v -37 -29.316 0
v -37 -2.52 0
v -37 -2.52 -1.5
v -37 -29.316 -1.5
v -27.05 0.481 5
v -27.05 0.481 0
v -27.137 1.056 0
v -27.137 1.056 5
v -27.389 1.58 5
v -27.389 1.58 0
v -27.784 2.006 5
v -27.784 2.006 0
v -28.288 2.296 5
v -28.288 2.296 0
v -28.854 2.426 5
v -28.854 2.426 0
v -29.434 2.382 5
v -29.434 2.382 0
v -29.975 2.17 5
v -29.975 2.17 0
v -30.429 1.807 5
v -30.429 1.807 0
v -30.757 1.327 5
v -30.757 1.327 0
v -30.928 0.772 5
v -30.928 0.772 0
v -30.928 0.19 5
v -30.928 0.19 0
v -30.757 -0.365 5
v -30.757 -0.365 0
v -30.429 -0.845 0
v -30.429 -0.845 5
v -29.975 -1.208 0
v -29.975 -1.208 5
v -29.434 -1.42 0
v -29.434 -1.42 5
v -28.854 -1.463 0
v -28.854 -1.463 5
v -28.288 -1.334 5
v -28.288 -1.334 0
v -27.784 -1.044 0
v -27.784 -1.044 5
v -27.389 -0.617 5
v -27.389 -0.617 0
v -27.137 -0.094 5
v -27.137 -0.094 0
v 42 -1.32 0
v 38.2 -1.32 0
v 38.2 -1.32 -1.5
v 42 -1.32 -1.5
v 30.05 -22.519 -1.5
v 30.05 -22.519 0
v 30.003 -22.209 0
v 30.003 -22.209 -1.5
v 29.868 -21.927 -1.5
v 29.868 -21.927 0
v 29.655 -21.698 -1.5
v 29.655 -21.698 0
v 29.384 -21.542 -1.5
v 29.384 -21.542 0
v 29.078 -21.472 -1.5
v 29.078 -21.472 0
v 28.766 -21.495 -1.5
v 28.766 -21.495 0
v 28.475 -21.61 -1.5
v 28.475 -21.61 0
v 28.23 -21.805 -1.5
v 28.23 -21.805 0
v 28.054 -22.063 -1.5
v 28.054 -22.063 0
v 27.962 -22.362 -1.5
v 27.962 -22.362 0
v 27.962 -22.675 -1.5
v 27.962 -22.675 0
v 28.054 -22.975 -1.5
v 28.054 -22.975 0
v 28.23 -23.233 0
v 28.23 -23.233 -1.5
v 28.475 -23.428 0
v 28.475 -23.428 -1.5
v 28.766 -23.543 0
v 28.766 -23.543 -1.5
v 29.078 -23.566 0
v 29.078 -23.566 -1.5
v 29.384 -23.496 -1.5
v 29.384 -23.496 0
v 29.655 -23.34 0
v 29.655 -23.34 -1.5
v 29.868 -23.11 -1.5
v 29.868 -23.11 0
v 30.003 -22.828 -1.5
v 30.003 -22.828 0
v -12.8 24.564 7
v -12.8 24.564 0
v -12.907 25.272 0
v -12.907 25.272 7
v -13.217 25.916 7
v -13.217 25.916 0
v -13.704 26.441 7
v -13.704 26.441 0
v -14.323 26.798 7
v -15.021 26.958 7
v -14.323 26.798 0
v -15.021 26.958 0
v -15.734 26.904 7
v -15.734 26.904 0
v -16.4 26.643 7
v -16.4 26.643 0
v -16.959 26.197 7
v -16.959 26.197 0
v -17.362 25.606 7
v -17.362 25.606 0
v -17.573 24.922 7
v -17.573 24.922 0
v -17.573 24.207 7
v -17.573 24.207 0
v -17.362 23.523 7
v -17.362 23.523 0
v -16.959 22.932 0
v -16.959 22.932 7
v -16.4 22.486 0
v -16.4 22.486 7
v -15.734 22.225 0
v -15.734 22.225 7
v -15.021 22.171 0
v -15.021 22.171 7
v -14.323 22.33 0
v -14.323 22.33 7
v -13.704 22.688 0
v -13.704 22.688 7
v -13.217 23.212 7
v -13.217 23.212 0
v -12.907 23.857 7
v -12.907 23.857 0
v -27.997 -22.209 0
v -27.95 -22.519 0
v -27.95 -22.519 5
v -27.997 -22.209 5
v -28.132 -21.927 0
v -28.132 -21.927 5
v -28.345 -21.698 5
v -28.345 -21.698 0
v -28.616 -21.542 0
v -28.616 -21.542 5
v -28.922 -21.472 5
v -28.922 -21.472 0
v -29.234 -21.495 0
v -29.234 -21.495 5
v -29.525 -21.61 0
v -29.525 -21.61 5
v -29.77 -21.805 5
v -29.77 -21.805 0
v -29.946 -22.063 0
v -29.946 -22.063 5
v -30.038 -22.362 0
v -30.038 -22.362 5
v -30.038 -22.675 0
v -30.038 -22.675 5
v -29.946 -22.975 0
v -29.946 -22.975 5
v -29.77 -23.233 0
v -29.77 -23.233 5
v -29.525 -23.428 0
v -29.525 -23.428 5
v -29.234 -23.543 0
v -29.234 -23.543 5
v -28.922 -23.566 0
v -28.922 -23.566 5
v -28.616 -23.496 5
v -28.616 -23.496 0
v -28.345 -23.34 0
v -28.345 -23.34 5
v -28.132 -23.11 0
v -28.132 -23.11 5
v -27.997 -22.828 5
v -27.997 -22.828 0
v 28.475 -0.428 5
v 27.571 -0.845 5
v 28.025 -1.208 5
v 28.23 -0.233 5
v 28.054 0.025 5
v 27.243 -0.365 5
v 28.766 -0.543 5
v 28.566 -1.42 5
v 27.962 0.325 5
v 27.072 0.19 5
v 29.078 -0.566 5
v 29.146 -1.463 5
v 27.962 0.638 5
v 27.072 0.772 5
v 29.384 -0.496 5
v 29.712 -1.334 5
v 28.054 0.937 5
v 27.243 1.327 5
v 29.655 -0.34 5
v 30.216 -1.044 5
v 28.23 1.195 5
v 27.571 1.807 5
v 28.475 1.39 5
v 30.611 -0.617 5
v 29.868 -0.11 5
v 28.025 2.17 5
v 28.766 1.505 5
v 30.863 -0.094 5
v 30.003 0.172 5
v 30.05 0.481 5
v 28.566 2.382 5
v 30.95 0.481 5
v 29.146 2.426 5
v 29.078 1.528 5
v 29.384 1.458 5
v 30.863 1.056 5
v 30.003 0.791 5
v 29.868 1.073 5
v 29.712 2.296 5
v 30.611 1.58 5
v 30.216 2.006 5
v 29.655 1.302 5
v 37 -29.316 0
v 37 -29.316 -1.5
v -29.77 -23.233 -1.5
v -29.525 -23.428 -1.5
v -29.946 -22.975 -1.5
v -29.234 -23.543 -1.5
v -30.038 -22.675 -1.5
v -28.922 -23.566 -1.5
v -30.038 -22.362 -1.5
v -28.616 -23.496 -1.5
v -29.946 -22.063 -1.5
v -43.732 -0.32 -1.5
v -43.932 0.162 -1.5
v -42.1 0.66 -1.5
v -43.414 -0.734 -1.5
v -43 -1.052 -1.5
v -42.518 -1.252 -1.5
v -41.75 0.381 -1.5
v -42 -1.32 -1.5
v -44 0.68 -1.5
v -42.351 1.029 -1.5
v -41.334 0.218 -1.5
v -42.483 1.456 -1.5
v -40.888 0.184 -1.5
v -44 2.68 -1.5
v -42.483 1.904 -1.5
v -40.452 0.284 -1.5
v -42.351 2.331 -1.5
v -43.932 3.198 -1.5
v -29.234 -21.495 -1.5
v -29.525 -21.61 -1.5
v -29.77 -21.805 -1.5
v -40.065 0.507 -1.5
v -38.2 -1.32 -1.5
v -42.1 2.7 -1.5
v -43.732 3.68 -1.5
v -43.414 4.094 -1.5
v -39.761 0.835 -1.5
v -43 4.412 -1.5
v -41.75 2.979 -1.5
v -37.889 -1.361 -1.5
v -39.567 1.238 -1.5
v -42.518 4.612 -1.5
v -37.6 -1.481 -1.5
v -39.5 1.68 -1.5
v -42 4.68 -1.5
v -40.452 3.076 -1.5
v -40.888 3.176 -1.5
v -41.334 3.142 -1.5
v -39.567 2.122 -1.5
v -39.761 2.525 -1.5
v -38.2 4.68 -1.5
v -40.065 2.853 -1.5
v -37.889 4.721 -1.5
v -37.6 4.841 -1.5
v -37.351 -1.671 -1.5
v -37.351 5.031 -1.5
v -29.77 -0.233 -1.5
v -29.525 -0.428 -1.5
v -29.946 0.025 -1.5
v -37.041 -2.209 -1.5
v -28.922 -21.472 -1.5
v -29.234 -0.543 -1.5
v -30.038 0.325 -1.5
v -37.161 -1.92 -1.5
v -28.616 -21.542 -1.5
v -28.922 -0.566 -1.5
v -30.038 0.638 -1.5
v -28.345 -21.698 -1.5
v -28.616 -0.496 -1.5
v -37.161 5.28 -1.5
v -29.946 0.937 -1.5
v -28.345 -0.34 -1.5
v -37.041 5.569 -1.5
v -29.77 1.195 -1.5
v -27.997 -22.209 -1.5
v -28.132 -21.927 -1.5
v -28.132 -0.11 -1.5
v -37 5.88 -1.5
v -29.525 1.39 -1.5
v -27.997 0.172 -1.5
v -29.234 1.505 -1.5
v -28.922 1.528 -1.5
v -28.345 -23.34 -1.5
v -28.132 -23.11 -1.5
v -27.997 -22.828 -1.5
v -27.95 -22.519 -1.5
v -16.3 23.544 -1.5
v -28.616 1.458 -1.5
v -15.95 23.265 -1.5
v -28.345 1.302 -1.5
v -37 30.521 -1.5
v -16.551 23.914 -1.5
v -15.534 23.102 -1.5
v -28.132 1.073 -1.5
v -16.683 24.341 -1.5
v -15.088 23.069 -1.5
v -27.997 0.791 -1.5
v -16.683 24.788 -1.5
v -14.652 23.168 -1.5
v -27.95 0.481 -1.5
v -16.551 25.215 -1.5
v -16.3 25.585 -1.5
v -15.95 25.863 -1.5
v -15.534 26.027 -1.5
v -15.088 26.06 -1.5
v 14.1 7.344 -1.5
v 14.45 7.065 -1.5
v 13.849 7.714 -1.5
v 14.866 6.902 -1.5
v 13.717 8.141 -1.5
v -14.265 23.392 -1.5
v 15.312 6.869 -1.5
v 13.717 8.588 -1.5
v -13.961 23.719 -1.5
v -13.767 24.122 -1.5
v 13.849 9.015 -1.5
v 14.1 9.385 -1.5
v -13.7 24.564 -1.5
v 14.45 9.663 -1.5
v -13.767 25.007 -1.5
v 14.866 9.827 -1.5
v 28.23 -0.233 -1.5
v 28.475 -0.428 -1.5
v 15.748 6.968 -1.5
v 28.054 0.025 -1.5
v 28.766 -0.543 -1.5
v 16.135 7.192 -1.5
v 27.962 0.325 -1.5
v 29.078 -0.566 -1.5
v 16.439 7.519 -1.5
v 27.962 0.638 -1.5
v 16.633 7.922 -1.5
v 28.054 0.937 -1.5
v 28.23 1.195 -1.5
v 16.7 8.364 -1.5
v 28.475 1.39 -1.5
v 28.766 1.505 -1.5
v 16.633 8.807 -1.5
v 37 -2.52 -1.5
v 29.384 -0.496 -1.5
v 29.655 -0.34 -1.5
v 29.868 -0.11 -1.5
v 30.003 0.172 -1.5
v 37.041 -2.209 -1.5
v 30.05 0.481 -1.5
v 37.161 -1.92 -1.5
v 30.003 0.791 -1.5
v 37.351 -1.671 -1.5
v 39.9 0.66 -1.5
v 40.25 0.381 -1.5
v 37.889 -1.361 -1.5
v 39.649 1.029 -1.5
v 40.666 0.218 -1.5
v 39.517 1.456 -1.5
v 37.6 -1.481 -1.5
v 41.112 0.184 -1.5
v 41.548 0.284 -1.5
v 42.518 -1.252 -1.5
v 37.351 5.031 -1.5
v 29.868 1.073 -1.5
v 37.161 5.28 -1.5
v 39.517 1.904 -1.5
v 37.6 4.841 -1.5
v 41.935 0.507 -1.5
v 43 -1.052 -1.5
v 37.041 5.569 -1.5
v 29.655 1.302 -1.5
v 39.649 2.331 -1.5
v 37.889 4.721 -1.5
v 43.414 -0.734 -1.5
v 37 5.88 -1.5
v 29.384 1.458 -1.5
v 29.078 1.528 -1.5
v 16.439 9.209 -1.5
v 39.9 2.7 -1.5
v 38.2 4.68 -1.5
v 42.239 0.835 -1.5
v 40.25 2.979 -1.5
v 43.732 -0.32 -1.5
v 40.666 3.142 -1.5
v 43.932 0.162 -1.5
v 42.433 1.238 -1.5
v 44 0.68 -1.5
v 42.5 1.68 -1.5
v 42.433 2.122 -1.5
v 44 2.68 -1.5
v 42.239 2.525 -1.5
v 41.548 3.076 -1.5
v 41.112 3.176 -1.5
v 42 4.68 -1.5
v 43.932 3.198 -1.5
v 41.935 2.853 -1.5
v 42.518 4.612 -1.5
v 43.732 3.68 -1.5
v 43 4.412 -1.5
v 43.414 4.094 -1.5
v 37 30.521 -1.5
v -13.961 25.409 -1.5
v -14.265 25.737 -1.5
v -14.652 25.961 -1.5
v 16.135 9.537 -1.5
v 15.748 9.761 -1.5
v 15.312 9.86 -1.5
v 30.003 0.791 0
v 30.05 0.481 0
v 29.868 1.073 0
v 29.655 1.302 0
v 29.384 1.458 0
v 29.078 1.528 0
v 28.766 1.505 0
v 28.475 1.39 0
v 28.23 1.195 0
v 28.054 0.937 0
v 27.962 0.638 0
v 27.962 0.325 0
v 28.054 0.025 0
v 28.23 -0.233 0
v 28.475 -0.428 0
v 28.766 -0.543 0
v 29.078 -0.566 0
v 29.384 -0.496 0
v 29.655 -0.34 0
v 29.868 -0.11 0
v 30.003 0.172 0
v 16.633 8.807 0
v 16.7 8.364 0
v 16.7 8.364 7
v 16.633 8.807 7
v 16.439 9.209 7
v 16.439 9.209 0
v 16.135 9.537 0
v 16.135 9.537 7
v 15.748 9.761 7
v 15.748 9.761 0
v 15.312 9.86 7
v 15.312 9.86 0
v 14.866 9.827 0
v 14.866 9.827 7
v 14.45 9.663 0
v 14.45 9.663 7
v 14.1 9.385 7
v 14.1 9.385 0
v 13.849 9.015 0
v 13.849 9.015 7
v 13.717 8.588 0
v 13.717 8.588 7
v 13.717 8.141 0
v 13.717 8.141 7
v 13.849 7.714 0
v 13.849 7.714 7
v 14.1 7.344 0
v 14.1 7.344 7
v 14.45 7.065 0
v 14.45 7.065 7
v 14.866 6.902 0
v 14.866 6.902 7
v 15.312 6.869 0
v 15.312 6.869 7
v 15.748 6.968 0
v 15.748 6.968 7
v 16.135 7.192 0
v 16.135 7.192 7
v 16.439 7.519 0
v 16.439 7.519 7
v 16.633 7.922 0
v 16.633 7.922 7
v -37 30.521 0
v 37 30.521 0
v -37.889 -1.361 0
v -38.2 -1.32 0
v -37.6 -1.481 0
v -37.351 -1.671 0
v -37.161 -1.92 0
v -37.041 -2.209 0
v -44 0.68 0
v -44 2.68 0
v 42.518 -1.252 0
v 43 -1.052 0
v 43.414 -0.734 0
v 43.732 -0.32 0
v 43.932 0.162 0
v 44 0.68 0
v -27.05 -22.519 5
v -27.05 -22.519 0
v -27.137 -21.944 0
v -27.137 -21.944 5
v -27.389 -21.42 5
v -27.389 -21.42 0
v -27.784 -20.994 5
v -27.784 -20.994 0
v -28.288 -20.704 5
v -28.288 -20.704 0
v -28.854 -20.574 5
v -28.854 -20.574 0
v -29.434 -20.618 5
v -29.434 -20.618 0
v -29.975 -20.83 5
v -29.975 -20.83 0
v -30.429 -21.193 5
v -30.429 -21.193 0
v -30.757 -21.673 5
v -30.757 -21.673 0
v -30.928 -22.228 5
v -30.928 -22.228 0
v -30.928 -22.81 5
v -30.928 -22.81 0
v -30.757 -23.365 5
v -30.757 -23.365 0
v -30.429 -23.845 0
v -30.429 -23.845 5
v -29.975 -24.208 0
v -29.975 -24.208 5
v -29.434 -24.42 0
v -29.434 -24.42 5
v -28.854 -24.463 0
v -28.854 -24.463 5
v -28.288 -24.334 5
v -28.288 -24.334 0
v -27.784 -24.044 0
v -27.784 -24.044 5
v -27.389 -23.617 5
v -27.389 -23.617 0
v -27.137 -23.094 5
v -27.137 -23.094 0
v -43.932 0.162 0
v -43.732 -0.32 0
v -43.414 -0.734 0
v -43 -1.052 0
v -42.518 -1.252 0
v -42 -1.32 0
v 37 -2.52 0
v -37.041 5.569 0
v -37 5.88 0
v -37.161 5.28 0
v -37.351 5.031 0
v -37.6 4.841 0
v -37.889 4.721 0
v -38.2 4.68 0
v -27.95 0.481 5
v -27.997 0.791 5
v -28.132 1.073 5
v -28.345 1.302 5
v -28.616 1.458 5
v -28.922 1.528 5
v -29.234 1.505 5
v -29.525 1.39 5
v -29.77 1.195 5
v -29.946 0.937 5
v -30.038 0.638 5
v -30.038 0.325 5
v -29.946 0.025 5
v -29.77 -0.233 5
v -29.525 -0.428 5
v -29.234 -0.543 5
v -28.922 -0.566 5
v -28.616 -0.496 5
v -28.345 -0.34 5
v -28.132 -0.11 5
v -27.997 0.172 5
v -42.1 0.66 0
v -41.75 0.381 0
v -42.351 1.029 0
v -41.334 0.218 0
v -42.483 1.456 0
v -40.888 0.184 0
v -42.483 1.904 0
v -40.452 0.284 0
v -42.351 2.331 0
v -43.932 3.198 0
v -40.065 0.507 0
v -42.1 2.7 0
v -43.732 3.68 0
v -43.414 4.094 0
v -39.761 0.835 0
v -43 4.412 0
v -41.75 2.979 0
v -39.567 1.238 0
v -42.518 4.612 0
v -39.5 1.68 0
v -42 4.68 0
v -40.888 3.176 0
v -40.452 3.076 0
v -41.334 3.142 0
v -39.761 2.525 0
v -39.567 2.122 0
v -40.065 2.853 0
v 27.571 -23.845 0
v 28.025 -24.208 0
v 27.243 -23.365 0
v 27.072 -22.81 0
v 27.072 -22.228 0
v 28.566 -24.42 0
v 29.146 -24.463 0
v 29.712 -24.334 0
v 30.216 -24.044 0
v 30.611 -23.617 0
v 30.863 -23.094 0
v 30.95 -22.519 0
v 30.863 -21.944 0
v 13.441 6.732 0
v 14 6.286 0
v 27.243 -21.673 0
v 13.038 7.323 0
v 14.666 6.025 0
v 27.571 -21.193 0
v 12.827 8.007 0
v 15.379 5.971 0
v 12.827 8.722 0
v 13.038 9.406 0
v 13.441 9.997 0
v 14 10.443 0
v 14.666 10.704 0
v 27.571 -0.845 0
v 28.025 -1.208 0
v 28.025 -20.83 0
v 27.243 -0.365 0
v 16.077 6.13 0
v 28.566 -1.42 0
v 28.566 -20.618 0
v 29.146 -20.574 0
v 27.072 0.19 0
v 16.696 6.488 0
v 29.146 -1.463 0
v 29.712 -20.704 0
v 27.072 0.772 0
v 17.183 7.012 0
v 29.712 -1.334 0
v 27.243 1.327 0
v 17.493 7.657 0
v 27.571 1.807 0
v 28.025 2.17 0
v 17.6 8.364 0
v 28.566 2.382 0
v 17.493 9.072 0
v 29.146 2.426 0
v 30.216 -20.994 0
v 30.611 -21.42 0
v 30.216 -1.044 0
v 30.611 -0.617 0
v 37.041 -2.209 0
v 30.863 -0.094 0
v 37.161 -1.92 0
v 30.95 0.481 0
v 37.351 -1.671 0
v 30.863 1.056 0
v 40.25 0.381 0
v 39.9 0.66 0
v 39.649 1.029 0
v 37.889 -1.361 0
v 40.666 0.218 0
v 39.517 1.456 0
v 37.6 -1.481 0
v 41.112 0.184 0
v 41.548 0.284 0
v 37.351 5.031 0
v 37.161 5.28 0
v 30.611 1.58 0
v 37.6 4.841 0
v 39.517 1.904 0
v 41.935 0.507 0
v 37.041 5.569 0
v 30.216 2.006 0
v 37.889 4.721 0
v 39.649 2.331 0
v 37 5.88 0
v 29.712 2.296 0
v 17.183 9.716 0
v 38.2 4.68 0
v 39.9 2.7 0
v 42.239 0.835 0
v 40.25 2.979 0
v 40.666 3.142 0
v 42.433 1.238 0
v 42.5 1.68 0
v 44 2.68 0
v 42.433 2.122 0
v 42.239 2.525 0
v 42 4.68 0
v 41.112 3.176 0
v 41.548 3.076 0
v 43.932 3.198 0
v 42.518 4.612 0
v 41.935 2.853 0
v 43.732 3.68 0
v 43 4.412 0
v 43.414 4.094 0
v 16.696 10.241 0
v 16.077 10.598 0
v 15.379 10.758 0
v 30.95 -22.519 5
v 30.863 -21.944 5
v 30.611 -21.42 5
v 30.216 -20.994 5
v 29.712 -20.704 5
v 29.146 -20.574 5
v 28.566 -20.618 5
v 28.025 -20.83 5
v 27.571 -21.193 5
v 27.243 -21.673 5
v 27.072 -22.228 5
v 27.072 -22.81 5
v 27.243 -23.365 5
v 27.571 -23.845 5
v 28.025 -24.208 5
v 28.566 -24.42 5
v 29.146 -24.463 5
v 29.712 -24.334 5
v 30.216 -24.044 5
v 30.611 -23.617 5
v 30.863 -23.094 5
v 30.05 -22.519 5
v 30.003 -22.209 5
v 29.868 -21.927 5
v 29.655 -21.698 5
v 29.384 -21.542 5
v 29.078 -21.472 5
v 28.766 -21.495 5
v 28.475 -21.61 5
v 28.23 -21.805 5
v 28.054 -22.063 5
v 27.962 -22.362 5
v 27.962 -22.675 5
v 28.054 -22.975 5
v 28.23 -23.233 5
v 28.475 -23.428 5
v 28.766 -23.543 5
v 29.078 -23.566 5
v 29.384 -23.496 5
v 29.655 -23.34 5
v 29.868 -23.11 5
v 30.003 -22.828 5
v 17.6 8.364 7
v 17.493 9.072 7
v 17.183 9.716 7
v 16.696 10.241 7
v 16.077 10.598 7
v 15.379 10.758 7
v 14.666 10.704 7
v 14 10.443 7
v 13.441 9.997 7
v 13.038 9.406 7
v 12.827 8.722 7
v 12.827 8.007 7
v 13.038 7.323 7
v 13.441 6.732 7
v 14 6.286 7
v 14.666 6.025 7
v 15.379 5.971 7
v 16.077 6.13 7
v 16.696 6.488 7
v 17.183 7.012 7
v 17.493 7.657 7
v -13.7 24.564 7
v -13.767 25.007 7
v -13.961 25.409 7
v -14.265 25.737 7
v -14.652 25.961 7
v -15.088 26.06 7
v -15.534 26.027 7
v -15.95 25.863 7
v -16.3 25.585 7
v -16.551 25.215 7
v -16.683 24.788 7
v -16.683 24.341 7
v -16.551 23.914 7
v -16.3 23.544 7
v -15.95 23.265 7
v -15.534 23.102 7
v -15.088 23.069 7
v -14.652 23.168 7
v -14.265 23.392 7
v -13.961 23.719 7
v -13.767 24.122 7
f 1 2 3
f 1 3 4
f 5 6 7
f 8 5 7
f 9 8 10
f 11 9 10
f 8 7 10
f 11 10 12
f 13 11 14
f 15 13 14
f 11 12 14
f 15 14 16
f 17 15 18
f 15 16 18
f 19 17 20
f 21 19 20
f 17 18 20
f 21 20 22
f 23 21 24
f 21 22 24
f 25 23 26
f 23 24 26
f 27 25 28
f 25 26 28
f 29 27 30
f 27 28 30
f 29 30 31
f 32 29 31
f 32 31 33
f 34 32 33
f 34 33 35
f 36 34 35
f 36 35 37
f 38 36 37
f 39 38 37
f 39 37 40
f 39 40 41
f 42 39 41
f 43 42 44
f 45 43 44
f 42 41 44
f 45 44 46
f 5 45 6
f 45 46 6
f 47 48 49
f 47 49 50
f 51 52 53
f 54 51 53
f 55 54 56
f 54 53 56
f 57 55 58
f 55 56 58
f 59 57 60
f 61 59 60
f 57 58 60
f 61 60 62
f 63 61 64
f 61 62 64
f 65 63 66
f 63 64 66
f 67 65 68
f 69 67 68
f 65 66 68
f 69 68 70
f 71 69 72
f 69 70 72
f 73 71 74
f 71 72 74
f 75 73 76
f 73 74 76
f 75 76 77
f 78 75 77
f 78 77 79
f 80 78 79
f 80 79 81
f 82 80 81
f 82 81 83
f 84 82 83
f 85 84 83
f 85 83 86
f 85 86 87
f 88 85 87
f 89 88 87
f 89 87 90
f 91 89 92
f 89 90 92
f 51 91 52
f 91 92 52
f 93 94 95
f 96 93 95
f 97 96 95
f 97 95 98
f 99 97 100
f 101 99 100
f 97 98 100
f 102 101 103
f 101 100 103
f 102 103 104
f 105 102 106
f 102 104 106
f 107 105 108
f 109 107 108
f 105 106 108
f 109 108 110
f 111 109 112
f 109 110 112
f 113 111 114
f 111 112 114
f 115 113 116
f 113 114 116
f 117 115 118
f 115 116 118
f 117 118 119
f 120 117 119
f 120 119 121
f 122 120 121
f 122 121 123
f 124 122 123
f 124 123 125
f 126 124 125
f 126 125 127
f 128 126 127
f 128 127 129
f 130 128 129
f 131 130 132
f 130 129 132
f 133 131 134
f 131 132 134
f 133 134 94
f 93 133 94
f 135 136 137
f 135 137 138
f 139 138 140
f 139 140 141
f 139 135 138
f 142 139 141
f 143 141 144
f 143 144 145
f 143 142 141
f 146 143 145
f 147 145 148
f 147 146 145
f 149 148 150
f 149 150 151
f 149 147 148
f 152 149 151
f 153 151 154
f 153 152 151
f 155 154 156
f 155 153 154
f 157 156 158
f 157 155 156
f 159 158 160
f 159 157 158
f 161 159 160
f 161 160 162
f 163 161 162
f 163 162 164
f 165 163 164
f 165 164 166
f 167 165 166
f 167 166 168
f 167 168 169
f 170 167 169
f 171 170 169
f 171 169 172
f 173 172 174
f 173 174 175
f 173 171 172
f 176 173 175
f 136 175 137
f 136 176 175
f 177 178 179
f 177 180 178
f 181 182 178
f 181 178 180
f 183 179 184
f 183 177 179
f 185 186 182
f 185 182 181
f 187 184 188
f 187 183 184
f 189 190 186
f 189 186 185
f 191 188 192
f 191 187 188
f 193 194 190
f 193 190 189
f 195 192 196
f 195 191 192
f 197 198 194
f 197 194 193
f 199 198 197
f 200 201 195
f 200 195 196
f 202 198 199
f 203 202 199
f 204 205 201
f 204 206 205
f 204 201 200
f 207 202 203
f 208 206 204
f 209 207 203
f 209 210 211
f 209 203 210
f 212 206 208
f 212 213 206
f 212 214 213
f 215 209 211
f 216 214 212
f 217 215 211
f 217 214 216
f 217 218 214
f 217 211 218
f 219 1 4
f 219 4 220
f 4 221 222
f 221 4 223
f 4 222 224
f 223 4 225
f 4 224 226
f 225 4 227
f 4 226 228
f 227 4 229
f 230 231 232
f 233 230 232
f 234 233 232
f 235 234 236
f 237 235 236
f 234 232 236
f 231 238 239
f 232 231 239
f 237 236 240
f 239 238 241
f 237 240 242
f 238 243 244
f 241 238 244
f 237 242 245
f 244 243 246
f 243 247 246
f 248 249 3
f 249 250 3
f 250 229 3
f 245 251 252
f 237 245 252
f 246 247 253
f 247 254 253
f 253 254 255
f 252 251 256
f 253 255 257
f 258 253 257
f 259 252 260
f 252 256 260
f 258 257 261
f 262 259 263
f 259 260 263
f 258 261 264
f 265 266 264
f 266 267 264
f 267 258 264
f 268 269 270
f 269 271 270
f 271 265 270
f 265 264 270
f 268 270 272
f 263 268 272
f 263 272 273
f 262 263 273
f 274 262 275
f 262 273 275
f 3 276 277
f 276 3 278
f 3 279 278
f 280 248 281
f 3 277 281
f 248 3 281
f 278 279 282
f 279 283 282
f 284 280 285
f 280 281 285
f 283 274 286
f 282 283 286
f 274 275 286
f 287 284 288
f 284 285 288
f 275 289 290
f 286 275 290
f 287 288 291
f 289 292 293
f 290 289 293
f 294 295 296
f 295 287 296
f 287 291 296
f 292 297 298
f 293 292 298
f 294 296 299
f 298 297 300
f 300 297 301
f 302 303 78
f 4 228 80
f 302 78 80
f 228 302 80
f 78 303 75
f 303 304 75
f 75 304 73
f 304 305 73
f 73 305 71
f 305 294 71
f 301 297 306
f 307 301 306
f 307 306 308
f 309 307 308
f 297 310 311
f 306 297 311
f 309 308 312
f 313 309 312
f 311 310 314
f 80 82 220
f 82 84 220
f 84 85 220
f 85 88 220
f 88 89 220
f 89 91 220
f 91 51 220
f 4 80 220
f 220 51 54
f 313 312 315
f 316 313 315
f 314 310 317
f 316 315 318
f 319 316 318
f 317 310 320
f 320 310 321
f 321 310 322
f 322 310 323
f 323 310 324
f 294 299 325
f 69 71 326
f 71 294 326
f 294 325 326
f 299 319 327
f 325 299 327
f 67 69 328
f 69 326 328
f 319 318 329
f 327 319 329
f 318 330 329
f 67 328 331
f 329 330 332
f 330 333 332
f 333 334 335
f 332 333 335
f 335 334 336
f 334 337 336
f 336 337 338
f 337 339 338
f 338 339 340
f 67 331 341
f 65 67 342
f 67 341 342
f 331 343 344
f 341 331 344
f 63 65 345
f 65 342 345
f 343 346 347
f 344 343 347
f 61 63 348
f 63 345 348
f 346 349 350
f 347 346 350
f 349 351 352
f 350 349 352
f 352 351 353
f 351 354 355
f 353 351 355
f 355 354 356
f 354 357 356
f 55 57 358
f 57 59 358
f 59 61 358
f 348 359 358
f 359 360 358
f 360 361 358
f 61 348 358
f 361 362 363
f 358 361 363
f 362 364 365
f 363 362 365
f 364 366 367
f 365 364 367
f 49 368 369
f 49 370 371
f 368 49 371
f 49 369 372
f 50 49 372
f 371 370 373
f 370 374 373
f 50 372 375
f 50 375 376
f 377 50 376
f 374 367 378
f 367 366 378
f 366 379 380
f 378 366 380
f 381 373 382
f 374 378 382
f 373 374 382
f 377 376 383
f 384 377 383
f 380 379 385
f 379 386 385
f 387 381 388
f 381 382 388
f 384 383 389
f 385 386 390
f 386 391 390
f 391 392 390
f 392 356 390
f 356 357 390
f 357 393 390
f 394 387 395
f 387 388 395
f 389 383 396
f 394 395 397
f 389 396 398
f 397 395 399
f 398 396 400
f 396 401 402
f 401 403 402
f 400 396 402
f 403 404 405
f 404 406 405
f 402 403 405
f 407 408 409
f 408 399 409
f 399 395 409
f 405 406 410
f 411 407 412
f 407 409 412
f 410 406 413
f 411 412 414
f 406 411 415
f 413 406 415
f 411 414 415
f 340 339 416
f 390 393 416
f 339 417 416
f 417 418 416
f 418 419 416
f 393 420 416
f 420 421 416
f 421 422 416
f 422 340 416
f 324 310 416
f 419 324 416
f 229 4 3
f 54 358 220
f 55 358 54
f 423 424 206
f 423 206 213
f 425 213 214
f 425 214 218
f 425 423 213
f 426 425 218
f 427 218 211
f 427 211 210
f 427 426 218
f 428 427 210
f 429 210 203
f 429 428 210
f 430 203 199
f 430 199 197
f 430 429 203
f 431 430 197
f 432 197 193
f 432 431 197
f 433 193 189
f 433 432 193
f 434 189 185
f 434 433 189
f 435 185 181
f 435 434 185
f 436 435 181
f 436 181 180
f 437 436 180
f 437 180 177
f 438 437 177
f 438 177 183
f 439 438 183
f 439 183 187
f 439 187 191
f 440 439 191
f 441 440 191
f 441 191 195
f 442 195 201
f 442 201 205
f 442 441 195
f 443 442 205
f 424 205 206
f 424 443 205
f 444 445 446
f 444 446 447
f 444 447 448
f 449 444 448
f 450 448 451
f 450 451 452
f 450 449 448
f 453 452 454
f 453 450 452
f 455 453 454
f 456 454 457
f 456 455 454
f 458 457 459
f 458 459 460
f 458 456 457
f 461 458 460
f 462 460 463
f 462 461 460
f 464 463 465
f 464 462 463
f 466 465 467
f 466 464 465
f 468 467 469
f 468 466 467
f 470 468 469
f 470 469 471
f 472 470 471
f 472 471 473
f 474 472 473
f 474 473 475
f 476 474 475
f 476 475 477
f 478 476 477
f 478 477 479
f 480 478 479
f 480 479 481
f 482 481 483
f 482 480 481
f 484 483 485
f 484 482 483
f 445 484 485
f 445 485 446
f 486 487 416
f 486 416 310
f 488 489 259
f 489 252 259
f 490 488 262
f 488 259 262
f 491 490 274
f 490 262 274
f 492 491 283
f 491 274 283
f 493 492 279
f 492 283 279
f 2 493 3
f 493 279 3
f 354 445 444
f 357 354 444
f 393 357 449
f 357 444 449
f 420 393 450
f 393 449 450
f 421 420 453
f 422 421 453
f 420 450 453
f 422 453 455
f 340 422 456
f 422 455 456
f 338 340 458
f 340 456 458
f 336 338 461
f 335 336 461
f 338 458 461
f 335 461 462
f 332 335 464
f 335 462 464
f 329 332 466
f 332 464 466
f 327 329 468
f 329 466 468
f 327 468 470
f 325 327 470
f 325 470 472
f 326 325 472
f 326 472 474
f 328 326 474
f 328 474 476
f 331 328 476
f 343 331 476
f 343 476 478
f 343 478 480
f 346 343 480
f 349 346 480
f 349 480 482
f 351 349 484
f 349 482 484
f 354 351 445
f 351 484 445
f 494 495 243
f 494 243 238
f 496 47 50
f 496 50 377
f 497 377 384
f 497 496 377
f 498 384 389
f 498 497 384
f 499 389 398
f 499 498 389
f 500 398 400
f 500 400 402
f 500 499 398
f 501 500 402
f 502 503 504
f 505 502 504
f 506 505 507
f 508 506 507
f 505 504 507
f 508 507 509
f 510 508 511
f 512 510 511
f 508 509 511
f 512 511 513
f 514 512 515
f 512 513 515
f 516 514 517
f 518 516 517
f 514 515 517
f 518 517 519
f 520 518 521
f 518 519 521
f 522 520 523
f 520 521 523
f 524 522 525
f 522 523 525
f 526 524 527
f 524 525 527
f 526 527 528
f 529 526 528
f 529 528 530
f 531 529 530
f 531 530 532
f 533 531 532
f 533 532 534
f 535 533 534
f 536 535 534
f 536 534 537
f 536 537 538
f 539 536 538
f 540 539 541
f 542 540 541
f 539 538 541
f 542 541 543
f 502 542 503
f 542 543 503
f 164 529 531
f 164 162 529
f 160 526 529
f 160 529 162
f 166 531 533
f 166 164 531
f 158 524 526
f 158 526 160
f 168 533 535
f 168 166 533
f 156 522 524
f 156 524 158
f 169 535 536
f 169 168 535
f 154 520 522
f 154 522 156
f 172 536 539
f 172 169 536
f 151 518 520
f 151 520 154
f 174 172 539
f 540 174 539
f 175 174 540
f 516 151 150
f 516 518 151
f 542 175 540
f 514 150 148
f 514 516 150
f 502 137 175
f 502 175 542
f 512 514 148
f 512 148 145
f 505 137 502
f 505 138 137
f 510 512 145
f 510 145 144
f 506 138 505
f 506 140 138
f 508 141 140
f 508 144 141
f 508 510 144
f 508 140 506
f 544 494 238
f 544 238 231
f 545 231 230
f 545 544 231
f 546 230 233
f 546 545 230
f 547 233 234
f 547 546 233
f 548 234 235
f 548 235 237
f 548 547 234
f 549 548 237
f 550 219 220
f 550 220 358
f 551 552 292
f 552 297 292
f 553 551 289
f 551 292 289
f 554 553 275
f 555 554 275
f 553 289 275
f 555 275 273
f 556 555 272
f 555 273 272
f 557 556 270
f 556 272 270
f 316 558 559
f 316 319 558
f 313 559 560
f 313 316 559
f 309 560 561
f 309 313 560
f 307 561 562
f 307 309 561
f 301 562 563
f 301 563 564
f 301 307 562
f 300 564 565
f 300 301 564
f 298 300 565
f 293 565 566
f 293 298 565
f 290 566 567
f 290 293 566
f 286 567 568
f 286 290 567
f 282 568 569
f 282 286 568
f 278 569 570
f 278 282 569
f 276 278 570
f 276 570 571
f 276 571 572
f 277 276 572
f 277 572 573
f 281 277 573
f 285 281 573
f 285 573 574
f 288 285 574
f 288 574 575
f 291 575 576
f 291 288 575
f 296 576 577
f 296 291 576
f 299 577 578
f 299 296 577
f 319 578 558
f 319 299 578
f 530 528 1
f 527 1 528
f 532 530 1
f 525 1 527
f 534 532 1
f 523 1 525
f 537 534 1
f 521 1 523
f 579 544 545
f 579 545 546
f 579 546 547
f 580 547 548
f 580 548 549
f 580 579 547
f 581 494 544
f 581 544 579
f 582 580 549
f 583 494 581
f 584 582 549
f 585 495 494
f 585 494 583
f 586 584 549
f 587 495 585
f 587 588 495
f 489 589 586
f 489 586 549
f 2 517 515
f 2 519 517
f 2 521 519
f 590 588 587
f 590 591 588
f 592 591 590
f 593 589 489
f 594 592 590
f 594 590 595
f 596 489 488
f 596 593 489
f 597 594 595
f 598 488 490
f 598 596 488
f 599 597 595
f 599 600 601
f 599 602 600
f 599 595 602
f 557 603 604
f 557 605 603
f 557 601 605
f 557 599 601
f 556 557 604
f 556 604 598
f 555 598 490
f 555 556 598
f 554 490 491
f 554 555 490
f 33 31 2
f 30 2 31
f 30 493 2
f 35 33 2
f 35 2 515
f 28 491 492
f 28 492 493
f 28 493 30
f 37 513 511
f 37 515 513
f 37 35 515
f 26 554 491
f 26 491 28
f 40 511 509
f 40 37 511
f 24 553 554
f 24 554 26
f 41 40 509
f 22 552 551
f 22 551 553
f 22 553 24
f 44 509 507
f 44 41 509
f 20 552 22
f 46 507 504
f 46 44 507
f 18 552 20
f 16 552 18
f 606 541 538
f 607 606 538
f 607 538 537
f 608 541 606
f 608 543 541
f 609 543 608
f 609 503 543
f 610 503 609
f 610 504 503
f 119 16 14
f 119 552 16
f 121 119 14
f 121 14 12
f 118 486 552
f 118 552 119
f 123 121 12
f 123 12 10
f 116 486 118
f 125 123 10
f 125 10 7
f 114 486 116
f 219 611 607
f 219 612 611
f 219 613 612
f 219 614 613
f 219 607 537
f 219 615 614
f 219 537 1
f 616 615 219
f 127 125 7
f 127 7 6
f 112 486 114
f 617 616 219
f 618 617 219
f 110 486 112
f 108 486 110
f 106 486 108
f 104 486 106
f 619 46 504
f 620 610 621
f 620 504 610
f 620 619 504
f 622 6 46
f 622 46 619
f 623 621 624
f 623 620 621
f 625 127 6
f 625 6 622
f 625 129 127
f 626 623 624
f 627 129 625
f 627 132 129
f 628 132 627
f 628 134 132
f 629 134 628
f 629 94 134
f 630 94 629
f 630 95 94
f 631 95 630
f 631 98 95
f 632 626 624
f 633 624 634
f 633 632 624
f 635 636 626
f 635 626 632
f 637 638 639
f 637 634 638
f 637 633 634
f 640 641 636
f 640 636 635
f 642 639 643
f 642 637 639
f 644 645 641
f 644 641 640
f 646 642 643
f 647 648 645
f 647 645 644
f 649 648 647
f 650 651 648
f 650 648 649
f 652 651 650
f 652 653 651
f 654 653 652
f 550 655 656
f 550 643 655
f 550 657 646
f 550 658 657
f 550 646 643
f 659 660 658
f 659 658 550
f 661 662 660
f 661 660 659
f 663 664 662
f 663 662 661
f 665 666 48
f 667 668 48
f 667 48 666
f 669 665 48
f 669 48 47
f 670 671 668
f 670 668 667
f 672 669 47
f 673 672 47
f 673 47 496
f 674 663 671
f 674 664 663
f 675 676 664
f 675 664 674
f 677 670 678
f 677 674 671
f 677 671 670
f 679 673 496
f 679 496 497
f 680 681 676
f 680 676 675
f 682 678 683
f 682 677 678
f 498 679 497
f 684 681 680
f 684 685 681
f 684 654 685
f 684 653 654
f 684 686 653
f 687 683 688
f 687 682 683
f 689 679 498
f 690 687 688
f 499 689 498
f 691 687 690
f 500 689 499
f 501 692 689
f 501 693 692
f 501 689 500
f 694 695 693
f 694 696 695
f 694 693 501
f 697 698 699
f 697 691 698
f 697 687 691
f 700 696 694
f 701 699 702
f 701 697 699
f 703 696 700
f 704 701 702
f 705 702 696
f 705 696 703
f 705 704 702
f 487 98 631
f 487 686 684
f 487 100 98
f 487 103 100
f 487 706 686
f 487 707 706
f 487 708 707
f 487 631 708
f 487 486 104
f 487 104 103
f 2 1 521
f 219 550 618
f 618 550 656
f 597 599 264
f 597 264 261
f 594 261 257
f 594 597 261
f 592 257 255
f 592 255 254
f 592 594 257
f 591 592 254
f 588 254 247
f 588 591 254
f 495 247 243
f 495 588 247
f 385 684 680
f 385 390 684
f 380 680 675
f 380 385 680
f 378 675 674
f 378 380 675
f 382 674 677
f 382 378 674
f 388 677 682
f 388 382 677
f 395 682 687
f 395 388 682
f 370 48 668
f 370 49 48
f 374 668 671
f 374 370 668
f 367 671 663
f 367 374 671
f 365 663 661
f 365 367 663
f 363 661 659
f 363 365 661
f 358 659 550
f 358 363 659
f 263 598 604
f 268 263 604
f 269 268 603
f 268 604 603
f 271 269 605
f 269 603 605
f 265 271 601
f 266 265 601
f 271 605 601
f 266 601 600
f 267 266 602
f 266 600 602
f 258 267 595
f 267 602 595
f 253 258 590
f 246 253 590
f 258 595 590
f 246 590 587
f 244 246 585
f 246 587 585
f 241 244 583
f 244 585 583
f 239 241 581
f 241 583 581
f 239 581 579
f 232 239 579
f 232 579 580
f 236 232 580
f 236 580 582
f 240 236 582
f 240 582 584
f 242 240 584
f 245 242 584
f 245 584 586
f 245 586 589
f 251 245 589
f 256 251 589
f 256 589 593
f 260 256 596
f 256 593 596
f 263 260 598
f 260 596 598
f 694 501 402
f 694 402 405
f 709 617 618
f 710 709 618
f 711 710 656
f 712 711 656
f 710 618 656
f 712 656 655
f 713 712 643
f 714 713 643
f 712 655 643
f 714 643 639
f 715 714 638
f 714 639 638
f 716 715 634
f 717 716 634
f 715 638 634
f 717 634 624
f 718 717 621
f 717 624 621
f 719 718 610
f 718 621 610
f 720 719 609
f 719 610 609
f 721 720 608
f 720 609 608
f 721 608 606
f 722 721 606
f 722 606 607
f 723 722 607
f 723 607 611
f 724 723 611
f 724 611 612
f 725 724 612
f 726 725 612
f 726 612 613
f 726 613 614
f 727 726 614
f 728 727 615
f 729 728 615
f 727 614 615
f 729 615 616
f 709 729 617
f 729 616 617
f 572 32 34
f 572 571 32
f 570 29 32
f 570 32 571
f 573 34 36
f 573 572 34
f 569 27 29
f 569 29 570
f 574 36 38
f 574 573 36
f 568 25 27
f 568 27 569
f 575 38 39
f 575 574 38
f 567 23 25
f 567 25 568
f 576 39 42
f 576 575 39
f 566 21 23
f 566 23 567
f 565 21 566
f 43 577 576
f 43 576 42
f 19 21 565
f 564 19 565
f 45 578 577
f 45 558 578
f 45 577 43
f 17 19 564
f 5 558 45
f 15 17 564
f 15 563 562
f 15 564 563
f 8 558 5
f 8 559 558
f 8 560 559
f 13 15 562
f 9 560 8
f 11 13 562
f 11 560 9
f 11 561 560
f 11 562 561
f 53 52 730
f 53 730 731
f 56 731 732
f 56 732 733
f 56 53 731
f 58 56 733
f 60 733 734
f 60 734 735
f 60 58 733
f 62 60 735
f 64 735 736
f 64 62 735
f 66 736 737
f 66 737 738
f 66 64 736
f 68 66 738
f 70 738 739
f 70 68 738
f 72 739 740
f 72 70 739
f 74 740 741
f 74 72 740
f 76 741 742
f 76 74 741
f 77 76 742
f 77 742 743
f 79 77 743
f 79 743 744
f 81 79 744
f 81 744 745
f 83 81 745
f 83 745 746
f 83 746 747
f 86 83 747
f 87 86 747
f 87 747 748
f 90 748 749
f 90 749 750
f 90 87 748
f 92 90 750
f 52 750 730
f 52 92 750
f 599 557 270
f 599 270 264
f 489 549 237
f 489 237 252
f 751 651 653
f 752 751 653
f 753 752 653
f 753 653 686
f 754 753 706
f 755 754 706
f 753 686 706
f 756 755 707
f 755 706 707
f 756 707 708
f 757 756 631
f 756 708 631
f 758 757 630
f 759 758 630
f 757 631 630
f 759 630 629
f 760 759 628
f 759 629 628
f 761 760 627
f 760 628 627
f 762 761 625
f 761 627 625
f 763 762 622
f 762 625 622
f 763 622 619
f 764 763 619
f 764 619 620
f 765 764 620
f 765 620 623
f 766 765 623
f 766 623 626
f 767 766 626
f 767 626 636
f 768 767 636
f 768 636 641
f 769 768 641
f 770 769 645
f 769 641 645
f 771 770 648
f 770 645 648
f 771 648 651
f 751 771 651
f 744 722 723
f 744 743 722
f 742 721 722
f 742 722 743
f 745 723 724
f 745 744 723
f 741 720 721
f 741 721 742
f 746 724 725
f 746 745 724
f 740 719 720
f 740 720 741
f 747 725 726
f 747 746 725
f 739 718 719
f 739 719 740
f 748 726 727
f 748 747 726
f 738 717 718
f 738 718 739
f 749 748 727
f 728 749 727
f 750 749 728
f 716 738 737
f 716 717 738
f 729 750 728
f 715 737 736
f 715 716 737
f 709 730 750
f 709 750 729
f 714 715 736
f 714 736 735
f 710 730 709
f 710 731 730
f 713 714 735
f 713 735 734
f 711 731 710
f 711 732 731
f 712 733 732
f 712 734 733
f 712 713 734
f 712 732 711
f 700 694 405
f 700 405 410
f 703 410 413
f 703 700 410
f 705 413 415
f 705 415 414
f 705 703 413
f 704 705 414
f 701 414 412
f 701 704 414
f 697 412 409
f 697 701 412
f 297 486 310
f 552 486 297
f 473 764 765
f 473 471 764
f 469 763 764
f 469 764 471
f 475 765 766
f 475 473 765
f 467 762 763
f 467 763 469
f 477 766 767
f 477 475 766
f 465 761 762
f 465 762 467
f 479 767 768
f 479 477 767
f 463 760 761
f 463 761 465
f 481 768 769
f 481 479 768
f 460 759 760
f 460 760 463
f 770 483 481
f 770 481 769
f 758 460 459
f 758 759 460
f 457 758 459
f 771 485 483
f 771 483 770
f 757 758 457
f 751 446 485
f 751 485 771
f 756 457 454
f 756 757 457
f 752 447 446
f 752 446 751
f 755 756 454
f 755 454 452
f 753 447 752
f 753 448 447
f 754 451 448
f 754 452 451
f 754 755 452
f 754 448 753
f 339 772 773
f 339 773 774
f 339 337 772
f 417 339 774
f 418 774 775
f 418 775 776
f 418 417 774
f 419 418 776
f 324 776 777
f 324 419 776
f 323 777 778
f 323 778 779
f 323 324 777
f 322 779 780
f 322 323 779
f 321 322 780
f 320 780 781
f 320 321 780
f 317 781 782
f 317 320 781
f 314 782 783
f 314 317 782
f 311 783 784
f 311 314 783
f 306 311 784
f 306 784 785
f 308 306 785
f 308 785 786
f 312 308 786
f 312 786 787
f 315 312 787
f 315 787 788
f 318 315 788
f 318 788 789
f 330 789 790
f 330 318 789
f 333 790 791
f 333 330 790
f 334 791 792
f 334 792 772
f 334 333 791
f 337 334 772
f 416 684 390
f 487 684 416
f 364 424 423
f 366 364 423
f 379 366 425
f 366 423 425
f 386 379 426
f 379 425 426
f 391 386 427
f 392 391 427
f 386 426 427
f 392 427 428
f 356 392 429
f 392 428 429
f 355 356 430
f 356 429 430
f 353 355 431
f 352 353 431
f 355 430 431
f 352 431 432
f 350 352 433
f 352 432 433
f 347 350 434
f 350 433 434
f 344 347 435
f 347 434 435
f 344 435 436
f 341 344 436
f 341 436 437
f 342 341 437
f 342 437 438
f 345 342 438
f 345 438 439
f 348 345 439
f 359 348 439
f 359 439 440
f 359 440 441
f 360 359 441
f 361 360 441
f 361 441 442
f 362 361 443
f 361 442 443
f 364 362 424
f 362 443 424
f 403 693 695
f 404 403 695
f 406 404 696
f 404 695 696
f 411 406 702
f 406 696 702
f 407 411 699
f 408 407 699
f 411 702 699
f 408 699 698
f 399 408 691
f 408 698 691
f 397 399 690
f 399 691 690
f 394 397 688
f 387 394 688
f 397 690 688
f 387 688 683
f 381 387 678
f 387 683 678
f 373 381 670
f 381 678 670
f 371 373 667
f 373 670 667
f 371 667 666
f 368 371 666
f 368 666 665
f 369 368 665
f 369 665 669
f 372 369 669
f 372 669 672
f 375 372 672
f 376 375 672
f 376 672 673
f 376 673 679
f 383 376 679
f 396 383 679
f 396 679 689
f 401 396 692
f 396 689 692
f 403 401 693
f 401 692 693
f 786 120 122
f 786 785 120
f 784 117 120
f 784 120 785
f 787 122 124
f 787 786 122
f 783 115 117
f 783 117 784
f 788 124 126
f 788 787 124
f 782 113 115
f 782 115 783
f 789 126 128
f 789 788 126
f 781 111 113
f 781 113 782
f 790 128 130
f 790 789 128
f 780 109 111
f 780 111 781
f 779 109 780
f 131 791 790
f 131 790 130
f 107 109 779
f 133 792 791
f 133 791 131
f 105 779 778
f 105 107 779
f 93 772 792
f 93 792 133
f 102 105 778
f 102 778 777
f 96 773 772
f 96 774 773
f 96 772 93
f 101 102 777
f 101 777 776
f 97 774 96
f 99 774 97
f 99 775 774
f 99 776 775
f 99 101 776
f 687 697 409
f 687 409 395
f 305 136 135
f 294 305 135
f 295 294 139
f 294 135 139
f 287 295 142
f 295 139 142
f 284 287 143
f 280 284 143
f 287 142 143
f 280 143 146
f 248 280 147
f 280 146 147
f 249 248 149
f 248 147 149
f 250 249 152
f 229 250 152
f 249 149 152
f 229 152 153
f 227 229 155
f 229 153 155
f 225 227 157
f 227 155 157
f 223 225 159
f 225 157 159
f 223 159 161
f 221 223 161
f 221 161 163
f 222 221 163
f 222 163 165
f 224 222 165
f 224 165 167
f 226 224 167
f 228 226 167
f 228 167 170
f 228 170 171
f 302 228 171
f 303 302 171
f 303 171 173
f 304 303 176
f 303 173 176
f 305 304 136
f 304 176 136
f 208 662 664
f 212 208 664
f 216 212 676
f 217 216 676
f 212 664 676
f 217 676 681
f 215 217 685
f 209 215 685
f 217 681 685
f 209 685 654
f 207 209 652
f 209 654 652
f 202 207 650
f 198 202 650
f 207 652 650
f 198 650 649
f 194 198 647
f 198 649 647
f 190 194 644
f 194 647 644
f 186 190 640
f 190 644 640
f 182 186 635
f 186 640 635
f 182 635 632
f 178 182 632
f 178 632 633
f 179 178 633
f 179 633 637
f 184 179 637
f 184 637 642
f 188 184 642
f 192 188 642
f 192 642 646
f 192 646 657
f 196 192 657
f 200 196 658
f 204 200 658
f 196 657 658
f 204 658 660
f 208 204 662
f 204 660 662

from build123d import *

# Parameters (mm, degrees)
F0_R     = 1.05
F0_R_2   = 1.5
F1_DEPTH = 1.5
F3_R     = 1.2
F4_R     = 1.95
F4_R_2   = 1.05
F5_DEPTH = 5
F4_R_3   = 2.4
F4_R_4   = 1.5
F6_DEPTH = 7


with BuildPart() as f1:
    # F0 (on Top) → F1 (new body)
    with BuildSketch(Plane.XY):
        Polygon((37, 30.5212866254), (-37, 30.5212866254), (-37, 4.6800224319), (-37, -1.3199775681), (-37, -29.3157063685), (37, -29.3157063685), (37, -1.3199775681), (37, 4.6800224319), align=None)
        with Locations((-29, -22.5189467669)):
            Circle(F0_R, mode=Mode.SUBTRACT)
        with Locations((-29, 0.4810532331)):
            Circle(F0_R, mode=Mode.SUBTRACT)
        with Locations((29, -22.5189467669)):
            Circle(F0_R, mode=Mode.SUBTRACT)
        with Locations((29, 0.4810532331)):
            Circle(F0_R, mode=Mode.SUBTRACT)
        with Locations((-15.2, 24.5643973112)):
            Circle(F0_R_2, mode=Mode.SUBTRACT)
        with Locations((15.2, 8.3643973112)):
            Circle(F0_R_2, mode=Mode.SUBTRACT)
        with BuildLine():
            Line((-37, -1.3199775681), (-37, 4.6800224319))
            Line((-37, 4.6800224319), (-42, 4.6800224319))
            ThreePointArc((-42, 4.6800224319), (-43.4142135624, 4.0942359942), (-44, 2.6800224319))
            Line((-44, 2.6800224319), (-44, 0.6800224319))
            ThreePointArc((-44, 0.6800224319), (-43.4142135624, -0.7341911305), (-42, -1.3199775681))
            Line((-42, -1.3199775681), (-37, -1.3199775681))
        make_face()
        with Locations((-41, 1.6800224319)):
            Circle(F0_R_2, mode=Mode.SUBTRACT)
        with BuildLine():
            Line((42, 4.6800224319), (37, 4.6800224319))
            Line((37, 4.6800224319), (37, -1.3199775681))
            Line((37, -1.3199775681), (42, -1.3199775681))
            ThreePointArc((42, -1.3199775681), (43.4142135624, -0.7341911305), (44, 0.6800224319))
            Line((44, 0.6800224319), (44, 2.6800224319))
            ThreePointArc((44, 2.6800224319), (43.4142135624, 4.0942359942), (42, 4.6800224319))
        make_face()
        with Locations((41, 1.6800224319)):
            Circle(F0_R_2, mode=Mode.SUBTRACT)
    extrude(amount=-F1_DEPTH)

    # F3
    f3_edges = [f1.edges().sort_by_distance(p)[0] for p in [
        (-37, -1.319978, -0.75),
        (-37, 4.680022, -0.75),
        (37, -1.319978, -0.75),
        (37, 4.680022, -0.75),
    ]]
    fillet(f3_edges, radius=F3_R)

    # F4 (on face) → F5 (join)
    with BuildSketch(Plane.XY):
        with Locations((-29, 0.4810532331)):
            Circle(F4_R)
        with Locations((-29, 0.4810532331)):
            Circle(F4_R_2, mode=Mode.SUBTRACT)
        with Locations((-29, -22.5189467669)):
            Circle(F4_R)
        with Locations((-29, -22.5189467669)):
            Circle(F4_R_2, mode=Mode.SUBTRACT)
        with Locations((29, -22.5189467669)):
            Circle(F4_R)
        with Locations((29, -22.5189467669)):
            Circle(F4_R_2, mode=Mode.SUBTRACT)
        with Locations((29, 0.4810532331)):
            Circle(F4_R)
        with Locations((29, 0.4810532331)):
            Circle(F4_R_2, mode=Mode.SUBTRACT)
    extrude(amount=F5_DEPTH)

    # F4 (on face) → F6 (join)
    with BuildSketch(Plane.XY):
        with Locations((-15.2, 24.5643973112)):
            Circle(F4_R_3)
        with Locations((-15.2, 24.5643973112)):
            Circle(F4_R_4, mode=Mode.SUBTRACT)
        with Locations((15.2, 8.3643973112)):
            Circle(F4_R_3)
        with Locations((15.2, 8.3643973112)):
            Circle(F4_R_4, mode=Mode.SUBTRACT)
    extrude(amount=F6_DEPTH)


solid = f1.part
